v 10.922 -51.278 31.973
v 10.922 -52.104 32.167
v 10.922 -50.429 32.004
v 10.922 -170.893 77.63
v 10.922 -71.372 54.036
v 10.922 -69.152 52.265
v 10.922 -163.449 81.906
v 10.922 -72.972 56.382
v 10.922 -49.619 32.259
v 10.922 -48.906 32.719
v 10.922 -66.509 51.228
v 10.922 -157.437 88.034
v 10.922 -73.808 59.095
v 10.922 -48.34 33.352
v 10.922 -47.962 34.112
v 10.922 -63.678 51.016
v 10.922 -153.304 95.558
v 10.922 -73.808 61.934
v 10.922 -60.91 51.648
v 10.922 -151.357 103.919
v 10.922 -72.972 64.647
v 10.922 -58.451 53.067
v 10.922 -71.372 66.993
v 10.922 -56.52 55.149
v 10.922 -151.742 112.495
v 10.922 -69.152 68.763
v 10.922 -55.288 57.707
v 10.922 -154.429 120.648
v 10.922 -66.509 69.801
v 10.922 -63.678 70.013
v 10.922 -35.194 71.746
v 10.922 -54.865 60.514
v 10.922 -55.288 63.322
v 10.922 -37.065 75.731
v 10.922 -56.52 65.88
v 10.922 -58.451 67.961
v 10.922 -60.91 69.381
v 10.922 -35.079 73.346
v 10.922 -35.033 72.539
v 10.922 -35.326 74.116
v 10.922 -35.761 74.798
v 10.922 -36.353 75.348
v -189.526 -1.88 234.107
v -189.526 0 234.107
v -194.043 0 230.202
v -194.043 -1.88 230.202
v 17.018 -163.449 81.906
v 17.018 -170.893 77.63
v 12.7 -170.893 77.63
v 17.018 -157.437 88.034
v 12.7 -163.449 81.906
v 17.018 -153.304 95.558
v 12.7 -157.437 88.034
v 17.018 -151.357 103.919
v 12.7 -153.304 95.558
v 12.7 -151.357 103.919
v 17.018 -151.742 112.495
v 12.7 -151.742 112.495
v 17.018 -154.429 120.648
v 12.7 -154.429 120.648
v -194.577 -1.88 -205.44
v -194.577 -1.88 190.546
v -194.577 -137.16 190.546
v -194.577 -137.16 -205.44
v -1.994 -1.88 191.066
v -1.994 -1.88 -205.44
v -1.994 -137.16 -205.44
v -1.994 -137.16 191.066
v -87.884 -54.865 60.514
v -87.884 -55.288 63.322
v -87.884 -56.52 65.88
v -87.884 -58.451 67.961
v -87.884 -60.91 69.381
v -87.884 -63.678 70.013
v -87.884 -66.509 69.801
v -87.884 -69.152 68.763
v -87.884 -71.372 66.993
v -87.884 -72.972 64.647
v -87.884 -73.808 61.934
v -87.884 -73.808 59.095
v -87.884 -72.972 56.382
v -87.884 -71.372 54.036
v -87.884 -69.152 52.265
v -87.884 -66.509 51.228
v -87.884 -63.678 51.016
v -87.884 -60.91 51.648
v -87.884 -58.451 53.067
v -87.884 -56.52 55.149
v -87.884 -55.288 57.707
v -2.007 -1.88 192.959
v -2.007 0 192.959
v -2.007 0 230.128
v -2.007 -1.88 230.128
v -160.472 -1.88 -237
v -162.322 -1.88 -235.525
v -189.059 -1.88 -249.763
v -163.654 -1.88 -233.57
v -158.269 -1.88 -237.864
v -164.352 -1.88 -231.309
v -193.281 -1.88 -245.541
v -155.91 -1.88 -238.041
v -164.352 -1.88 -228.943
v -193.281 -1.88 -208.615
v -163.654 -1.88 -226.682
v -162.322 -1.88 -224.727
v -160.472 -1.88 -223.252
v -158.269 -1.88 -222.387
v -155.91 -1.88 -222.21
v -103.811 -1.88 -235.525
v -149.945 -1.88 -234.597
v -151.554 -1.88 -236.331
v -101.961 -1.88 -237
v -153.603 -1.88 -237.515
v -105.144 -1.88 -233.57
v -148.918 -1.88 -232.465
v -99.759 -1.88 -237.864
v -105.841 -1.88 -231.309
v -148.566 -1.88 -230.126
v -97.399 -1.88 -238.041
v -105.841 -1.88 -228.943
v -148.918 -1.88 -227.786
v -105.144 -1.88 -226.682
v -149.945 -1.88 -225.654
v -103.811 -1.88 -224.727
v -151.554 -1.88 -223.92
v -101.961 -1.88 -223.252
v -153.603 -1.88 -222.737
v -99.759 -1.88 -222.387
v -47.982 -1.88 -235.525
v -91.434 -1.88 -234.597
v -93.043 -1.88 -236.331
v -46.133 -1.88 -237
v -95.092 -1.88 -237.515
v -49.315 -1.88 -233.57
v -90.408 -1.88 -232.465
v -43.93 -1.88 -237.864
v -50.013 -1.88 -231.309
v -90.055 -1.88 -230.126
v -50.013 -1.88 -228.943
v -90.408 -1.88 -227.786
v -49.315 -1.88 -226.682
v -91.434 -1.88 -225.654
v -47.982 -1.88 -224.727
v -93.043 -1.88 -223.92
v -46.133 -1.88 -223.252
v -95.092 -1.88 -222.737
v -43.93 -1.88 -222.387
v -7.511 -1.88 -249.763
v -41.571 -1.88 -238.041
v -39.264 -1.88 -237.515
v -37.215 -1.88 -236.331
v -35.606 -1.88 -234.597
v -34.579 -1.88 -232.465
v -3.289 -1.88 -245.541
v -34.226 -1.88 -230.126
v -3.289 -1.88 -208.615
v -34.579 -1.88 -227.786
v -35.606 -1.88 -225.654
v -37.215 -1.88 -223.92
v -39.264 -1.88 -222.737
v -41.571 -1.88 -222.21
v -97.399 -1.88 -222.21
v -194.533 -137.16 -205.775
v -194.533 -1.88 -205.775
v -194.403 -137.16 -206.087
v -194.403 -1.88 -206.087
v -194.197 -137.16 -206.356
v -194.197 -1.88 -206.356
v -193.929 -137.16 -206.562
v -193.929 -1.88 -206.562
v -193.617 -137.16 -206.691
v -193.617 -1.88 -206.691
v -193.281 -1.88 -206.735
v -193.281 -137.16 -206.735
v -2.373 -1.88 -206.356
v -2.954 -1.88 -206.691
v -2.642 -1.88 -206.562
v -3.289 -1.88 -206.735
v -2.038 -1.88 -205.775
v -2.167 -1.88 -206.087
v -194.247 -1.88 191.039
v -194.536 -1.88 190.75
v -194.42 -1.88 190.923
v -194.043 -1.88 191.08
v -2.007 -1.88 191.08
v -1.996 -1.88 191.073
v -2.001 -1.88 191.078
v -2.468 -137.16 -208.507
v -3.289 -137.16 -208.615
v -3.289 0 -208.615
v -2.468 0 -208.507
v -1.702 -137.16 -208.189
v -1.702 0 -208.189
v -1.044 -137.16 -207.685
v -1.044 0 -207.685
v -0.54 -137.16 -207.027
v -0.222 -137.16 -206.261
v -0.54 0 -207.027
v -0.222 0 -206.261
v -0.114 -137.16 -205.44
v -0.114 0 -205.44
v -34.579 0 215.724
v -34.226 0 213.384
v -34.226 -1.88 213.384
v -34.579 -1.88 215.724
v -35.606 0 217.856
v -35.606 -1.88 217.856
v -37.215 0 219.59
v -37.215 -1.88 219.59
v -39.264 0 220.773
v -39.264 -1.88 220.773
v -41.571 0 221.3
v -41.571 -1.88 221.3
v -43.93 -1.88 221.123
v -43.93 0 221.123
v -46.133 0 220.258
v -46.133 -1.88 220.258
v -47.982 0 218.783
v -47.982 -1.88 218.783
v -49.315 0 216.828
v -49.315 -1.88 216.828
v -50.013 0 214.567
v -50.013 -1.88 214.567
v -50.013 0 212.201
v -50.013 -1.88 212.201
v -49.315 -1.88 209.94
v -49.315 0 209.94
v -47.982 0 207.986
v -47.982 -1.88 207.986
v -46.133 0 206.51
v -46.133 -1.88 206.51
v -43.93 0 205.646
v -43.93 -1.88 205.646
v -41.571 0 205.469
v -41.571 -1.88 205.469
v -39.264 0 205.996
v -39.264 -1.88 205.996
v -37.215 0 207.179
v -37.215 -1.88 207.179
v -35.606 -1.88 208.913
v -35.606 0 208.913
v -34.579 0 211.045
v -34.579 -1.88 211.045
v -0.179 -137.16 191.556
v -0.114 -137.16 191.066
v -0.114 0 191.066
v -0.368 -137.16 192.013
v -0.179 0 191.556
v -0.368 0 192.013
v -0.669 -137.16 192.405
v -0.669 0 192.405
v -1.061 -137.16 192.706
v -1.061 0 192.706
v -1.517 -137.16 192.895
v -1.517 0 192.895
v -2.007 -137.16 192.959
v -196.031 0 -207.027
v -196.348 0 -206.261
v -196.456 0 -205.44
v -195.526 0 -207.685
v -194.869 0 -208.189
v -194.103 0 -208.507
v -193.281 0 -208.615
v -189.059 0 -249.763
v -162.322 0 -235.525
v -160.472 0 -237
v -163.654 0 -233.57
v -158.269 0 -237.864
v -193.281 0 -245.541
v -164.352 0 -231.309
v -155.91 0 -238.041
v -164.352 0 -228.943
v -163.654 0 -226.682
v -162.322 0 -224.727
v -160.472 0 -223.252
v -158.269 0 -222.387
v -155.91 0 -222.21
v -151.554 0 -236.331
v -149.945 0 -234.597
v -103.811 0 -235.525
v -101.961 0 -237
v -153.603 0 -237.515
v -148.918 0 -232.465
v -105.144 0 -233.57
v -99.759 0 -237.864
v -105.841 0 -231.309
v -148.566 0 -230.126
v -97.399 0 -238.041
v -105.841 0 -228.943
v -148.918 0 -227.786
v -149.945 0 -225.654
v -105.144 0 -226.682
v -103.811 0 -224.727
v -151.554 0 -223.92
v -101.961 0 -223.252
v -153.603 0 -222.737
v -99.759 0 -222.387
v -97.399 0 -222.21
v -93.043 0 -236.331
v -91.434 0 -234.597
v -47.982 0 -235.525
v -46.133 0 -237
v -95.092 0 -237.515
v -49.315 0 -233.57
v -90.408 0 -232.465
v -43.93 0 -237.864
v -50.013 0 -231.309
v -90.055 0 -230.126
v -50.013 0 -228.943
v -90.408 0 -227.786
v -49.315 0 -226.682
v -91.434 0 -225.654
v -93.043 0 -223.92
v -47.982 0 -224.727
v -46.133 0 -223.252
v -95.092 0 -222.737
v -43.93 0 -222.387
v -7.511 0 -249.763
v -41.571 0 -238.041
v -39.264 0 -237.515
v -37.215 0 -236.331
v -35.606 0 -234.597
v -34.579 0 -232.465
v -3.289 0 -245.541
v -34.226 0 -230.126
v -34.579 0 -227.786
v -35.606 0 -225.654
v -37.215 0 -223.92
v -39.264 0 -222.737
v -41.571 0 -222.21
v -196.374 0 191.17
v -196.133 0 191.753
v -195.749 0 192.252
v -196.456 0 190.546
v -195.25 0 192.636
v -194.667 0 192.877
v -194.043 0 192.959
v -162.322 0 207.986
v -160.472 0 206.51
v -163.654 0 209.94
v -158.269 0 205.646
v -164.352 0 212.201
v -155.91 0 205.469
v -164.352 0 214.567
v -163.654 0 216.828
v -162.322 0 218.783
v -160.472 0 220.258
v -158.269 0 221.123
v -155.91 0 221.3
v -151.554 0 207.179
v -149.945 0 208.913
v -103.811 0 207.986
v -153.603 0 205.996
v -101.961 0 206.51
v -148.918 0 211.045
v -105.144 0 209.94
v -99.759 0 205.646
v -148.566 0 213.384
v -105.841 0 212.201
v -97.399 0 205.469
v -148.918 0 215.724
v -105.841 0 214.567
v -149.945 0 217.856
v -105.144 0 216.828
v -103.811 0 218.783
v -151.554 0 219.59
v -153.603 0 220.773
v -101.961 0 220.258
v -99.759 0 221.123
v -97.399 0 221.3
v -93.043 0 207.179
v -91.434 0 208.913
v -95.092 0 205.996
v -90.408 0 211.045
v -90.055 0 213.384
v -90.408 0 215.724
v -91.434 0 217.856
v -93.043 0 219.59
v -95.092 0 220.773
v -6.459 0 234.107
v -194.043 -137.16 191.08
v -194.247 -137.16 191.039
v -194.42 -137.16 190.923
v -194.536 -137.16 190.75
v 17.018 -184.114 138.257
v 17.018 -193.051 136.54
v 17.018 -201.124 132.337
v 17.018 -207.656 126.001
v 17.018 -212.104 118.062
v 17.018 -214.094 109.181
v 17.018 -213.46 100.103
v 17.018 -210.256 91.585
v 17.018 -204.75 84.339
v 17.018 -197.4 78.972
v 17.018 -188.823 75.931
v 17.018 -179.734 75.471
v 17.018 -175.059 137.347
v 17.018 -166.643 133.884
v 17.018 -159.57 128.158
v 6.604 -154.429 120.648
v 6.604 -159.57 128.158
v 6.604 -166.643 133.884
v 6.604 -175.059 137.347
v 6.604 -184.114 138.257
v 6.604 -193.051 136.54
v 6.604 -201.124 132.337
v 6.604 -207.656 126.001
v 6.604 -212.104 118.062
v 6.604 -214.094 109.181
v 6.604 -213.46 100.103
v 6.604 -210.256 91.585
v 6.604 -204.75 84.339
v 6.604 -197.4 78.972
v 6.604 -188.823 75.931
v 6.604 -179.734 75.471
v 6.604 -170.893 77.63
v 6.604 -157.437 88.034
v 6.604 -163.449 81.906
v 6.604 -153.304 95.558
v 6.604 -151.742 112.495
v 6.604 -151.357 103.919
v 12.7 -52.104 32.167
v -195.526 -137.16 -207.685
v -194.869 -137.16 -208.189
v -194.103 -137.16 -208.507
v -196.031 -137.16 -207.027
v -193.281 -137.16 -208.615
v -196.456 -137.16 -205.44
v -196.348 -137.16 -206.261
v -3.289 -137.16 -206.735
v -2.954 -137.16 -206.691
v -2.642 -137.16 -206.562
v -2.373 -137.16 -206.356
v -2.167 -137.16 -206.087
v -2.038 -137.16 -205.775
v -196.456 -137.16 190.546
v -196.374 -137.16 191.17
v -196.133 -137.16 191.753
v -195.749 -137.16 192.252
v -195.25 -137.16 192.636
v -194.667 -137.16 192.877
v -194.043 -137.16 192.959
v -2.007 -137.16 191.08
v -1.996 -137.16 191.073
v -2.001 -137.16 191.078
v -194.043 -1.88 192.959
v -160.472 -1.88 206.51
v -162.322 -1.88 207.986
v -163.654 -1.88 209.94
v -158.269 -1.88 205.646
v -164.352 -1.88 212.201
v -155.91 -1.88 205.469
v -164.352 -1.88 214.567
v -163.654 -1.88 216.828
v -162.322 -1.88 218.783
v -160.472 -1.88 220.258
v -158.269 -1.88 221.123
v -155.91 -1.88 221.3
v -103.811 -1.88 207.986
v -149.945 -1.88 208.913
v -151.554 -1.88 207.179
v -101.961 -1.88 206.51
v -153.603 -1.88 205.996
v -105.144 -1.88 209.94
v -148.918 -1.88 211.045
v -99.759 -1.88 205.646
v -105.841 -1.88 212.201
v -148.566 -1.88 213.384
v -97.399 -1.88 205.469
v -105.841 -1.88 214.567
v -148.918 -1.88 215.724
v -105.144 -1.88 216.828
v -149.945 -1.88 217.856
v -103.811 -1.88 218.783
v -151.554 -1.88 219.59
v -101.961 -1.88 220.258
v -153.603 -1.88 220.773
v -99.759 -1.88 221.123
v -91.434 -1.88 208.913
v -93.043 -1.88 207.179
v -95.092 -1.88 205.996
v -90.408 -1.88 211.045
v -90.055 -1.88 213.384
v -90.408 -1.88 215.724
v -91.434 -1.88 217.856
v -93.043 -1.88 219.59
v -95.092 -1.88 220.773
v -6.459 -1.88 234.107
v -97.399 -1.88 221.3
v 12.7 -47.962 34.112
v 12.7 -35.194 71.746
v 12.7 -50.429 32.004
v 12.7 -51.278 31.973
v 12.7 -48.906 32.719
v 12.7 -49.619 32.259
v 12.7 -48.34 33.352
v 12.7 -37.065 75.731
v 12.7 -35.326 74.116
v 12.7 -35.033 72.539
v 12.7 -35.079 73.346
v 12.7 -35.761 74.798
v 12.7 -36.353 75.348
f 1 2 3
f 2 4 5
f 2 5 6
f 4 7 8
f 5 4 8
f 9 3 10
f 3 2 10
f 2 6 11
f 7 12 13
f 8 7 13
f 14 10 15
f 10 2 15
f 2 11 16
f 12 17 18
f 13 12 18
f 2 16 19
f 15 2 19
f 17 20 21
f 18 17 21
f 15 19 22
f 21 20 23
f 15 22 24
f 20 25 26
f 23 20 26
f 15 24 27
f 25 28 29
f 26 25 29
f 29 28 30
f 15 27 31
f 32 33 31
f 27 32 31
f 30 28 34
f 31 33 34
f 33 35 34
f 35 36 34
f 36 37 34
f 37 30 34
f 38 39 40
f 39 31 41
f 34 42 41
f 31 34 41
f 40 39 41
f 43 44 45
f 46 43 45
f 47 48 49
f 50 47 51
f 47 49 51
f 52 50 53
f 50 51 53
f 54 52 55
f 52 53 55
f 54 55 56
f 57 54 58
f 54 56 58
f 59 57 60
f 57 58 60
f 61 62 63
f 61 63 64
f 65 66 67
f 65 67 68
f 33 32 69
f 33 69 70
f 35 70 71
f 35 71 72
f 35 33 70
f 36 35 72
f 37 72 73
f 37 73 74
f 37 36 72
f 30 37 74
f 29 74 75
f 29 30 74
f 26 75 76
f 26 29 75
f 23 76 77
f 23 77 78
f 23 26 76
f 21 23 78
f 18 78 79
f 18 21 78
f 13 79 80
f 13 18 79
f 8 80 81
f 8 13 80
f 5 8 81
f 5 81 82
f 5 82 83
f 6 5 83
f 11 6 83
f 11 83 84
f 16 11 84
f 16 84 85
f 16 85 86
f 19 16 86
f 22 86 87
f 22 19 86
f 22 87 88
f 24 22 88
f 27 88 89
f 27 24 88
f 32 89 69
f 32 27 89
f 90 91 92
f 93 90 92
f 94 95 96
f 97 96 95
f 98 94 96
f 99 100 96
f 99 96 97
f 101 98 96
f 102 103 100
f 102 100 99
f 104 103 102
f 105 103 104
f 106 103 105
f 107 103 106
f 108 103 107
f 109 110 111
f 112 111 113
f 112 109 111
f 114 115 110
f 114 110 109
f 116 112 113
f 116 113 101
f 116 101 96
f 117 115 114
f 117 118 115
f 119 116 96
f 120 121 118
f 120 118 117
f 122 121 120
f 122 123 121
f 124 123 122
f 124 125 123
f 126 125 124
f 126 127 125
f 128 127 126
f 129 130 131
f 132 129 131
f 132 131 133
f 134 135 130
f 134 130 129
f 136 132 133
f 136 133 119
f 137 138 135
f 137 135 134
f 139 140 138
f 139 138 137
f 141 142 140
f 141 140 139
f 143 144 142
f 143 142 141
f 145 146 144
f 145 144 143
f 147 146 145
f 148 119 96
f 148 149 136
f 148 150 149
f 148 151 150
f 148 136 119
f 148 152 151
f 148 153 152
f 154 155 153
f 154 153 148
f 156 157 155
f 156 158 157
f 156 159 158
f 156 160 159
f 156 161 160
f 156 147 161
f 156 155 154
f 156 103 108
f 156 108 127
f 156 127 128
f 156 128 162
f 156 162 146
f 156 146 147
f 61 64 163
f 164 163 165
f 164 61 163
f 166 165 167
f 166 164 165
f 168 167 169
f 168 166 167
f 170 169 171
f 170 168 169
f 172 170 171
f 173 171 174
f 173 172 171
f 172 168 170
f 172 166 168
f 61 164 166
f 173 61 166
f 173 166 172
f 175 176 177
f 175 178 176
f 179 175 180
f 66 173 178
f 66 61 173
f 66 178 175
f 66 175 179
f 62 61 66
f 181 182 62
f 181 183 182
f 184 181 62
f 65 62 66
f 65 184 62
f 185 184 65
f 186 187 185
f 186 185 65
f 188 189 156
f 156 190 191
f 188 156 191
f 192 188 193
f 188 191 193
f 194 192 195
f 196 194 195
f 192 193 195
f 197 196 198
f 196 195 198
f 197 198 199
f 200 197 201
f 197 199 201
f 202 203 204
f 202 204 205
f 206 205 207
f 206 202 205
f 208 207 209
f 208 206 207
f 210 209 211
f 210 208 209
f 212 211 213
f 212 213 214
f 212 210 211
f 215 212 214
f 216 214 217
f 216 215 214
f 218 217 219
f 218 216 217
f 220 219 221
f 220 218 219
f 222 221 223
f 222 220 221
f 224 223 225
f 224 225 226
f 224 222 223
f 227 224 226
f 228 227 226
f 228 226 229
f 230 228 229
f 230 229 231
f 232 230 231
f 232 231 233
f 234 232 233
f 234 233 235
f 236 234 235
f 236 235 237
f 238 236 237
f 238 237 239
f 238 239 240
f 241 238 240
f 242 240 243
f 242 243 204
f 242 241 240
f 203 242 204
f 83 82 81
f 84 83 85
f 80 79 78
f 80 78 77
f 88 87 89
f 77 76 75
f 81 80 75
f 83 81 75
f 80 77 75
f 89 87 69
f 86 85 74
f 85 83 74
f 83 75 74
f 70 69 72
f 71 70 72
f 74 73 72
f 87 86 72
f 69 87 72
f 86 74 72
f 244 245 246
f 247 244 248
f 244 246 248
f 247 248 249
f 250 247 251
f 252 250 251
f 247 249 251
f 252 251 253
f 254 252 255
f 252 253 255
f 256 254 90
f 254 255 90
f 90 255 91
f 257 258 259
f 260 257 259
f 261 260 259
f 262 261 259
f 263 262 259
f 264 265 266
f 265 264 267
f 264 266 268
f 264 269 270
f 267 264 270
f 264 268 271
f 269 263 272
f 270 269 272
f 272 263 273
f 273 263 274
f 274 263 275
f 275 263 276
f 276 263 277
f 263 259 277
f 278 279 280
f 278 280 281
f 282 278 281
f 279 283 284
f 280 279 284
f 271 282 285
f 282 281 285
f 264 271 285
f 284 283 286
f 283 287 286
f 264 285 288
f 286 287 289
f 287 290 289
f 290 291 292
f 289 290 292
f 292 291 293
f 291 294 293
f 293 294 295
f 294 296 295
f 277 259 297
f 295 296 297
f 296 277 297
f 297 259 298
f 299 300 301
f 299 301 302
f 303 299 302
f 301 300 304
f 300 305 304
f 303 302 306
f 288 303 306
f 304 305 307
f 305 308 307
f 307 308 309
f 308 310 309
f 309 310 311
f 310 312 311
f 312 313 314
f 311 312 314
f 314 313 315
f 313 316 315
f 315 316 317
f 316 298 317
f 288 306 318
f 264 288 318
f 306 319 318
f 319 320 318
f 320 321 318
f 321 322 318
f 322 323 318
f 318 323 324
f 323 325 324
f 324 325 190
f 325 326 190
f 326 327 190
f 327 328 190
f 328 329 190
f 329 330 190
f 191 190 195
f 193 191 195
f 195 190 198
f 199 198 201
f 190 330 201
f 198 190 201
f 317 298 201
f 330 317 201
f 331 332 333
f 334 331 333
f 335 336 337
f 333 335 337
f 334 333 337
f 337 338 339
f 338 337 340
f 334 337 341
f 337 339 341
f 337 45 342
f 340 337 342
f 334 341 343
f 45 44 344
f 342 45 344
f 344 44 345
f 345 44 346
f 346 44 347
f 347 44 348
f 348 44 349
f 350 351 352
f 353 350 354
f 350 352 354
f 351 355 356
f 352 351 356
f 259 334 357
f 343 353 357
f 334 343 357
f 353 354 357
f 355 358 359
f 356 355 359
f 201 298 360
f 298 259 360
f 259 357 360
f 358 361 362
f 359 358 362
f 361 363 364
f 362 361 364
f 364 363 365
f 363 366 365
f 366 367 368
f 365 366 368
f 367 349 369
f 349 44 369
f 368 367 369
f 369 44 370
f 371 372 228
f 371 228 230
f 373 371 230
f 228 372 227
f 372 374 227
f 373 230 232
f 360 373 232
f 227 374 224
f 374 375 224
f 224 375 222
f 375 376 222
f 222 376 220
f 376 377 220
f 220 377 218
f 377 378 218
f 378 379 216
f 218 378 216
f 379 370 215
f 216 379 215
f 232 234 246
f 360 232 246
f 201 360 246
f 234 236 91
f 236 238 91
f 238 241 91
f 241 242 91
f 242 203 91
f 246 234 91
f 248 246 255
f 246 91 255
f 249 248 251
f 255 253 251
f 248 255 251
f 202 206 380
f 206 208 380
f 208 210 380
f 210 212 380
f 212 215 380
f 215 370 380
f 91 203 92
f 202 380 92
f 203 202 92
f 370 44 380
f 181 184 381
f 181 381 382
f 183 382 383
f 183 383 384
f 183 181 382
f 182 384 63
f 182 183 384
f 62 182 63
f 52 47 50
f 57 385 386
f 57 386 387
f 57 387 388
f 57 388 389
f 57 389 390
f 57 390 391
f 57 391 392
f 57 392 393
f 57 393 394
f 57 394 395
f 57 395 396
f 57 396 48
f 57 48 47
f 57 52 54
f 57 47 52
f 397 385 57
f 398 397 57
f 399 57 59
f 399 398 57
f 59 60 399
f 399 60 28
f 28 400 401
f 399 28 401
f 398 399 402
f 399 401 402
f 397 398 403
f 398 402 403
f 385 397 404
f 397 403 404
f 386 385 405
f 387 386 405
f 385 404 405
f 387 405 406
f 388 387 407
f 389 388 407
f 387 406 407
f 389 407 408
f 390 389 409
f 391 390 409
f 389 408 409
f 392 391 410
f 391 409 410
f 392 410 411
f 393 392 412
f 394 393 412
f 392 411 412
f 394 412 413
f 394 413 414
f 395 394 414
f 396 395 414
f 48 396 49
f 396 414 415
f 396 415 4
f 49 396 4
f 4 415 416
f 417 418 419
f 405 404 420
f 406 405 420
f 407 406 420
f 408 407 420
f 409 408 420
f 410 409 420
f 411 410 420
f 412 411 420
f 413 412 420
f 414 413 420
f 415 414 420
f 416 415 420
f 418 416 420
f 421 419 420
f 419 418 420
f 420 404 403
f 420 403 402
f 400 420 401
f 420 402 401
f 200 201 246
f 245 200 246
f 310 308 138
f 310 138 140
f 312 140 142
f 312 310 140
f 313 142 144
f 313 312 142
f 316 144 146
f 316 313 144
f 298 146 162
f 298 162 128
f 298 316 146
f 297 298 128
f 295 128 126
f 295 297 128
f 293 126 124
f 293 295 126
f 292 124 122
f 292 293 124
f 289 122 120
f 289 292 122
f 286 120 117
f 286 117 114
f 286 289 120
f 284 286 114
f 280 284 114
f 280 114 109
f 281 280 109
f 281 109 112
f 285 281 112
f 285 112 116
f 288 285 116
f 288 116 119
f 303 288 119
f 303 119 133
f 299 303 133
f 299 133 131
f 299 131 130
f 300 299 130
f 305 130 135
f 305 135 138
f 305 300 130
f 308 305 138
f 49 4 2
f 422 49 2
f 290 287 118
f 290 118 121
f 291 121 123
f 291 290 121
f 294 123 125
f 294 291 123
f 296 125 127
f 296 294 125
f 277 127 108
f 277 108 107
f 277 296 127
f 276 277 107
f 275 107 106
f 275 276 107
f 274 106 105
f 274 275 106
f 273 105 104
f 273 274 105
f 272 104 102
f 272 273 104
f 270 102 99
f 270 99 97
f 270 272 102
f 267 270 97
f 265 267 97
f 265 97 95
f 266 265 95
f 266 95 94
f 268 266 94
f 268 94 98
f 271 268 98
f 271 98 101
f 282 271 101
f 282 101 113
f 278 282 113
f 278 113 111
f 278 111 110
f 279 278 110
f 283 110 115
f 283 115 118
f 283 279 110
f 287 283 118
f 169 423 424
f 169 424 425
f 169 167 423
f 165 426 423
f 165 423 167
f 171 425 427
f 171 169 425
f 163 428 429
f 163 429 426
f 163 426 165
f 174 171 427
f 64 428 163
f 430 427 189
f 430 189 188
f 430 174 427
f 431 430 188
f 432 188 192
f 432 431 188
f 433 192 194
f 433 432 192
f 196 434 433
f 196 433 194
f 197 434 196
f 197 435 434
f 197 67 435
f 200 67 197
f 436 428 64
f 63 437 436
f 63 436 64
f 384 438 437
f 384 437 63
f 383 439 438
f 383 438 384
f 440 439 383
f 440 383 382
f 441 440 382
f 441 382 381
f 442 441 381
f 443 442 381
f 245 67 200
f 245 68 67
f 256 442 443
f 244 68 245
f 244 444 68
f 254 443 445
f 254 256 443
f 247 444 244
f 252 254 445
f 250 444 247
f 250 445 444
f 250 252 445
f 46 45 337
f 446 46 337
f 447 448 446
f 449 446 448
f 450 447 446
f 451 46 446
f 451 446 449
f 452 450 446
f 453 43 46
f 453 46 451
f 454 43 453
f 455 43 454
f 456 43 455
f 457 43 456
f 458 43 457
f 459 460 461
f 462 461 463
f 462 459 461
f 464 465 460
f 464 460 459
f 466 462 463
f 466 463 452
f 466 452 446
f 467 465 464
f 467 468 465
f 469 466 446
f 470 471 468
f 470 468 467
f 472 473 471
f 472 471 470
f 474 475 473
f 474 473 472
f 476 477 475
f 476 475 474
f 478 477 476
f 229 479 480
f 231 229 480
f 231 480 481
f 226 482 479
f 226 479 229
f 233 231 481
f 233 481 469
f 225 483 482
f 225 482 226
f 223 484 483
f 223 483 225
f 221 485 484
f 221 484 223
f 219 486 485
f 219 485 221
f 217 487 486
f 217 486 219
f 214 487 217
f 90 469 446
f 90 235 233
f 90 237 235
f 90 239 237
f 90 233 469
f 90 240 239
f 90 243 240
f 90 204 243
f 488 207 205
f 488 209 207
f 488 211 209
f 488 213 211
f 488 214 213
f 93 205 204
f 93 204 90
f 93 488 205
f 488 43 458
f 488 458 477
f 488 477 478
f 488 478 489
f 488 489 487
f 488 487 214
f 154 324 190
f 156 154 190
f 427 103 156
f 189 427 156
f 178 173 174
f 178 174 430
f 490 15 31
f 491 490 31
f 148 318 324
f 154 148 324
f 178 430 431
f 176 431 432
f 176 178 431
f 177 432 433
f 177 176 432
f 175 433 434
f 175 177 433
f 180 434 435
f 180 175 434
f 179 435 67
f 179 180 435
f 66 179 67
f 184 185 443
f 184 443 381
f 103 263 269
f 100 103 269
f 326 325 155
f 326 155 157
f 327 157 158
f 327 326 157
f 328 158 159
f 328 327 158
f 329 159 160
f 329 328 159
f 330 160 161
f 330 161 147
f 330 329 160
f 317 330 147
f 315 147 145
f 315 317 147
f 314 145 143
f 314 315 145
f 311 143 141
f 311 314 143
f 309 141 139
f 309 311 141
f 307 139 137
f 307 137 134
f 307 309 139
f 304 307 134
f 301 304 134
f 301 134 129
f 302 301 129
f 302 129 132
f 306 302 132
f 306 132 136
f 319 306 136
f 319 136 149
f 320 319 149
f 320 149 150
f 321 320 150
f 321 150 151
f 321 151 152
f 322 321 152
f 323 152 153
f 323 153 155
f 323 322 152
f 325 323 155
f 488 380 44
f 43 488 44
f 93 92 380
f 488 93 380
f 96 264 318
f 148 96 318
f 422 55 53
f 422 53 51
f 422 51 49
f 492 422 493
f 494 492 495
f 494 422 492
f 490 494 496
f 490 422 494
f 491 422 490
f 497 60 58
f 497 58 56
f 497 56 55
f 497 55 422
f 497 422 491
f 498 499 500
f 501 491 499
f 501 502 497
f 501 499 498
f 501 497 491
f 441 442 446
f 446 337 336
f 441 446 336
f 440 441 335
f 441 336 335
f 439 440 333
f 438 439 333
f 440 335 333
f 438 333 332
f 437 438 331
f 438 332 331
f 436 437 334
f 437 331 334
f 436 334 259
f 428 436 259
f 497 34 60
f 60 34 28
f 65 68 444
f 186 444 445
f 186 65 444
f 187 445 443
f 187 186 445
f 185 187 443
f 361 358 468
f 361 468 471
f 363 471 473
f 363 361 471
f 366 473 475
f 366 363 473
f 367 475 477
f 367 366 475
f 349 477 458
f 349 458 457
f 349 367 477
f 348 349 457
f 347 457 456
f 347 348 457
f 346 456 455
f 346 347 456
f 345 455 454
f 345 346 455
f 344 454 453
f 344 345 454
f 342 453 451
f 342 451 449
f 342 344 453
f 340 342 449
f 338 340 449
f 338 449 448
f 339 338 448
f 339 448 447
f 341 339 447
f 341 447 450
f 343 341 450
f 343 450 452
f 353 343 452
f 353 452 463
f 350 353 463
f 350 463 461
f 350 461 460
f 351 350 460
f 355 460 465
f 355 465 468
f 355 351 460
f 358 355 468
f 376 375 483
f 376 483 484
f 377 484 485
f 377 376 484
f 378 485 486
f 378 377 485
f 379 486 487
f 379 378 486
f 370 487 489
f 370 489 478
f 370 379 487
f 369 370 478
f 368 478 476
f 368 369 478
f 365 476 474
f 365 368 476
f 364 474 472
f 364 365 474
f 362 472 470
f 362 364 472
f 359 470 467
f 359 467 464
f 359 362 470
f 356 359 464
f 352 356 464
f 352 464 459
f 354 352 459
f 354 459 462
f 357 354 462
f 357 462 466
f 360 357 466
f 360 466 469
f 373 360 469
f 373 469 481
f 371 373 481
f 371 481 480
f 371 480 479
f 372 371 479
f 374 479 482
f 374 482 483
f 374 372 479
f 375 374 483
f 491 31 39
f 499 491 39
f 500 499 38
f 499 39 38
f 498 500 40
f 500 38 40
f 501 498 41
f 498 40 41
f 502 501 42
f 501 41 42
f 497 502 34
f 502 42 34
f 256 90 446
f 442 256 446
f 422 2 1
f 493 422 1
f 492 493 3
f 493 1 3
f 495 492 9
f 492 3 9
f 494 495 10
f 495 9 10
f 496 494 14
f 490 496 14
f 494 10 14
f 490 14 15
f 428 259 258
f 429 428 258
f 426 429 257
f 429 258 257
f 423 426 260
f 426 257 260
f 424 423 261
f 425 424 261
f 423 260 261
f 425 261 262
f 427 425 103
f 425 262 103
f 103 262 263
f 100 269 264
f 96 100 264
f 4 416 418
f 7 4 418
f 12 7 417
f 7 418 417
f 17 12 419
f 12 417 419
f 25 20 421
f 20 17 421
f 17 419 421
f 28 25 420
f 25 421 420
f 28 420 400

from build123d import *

# Parameters (mm, degrees)
F1_DEPTH      = 137.16
F2_T          = -1.8796
F0_R          = 7.9375
F3_DEPTH      = 1.8796
F4_DEPTH      = 1.8796
F5_R          = 9.525
F6_DEPTH      = 12.7
F6_DEPTH_BACK = 87.884
F7_START      = 10.922
F7_DEPTH      = 1.778
F8_START      = 6.604
F8_DEPTH      = 10.414


with BuildPart() as f1:
    # F0 (on Front) → F1 (new body)
    with BuildSketch(Plane.XZ):
        with BuildLine():
            Line((-2.0074219073, 192.9593032377), (-194.0428123108, 192.9593032377))
            ThreePointArc((-194.0428123108, 192.9593032377), (-195.7494105797, 192.2524070892), (-196.4563067282, 190.5458088203))
            Line((-196.4563067282, 190.5458088203), (-196.4563067282, -205.4396967623))
            ThreePointArc((-196.4563067282, -205.4396967623), (-195.5263707585, -207.6847607926), (-193.2813067282, -208.6146967623))
            Line((-193.2813067282, -208.6146967623), (-3.2893067282, -208.6146967623))
            ThreePointArc((-3.2893067282, -208.6146967623), (-1.044242698, -207.6847607926), (-0.1143067282, -205.4396967623))
            Line((-0.1143067282, -205.4396967623), (-0.1143067282, 191.0661880586))
            ThreePointArc((-0.1143067282, 191.0661880586), (-0.6687873266, 192.4048226393), (-2.0074219073, 192.9593032377))
        make_face()
    extrude(amount=F1_DEPTH)

    # F2
    f2_openings = [f1.faces().sort_by_distance(p)[0] for p in [
        (-98.284712, -137.16, -7.821846),
    ]]
    offset(amount=F2_T, openings=f2_openings)

    # F0 (on Front) → F3 (join)
    with BuildSketch(Plane.XZ):
        Polygon((-194.0428123108, 230.2024903454), (-194.0428123108, 192.9593032377), (-2.0074219073, 192.9593032377), (-2.0074219073, 230.1279707811), (-6.4590077951, 234.1073032377), (-189.5257181129, 234.1073032377), align=None)
        with Locations((-156.5030515194, 213.3844196796)):
            Circle(F0_R, mode=Mode.SUBTRACT)
        with Locations((-97.992362954, 213.3844196796)):
            Circle(F0_R, mode=Mode.SUBTRACT)
        with Locations((-42.1637892723, 213.3844196796)):
            Circle(F0_R, mode=Mode.SUBTRACT)
    extrude(amount=F3_DEPTH)

    # F0 (on Front) → F4 (join)
    with BuildSketch(Plane.XZ):
        Polygon((-3.2893067282, -208.6146967623), (-193.2813067282, -208.6146967623), (-193.2813067282, -245.5406295129), (-189.0592394788, -249.7626967623), (-7.5113739777, -249.7626967623), (-3.2893067282, -245.5406295129), align=None)
        with Locations((-156.5030515194, -230.1257103682)):
            Circle(F0_R, mode=Mode.SUBTRACT)
        with Locations((-97.992362954, -230.1257103682)):
            Circle(F0_R, mode=Mode.SUBTRACT)
        with Locations((-42.1637892723, -230.1257103682)):
            Circle(F0_R, mode=Mode.SUBTRACT)
    extrude(amount=F4_DEPTH)


with BuildPart() as f6:
    # F5 (on Right) → F6 (new body, two sides)
    with BuildSketch(Plane.YZ) as f6_sk:
        with Locations((-64.3898770213, 60.5143420398)):
            Circle(F5_R)
    extrude(amount=F6_DEPTH)
    extrude(f6_sk.sketch, amount=-F6_DEPTH_BACK)

    # F5 (on Right) → F7 (join)
    with BuildSketch(Plane.YZ.offset(F7_START)):
        with BuildLine():
            Line((-170.8932016047, 77.6299208061), (-52.1039823193, 32.1673765925))
            ThreePointArc((-52.1039823193, 32.1673765925), (-49.6194014967, 32.2588096218), (-47.9624834755, 34.1124882708))
            Line((-47.9624834755, 34.1124882708), (-35.1935953372, 71.7459684203))
            ThreePointArc((-35.1935953372, 71.7459684203), (-35.3264211342, 74.1158419365), (-37.0653924768, 75.7313671901))
            Line((-37.0653924768, 75.7313671901), (-154.4293258485, 120.6484315675))
            ThreePointArc((-154.4293258485, 120.6484315675), (-152.0360599698, 113.9122285626), (-151.2243511721, 106.8097443975))
            ThreePointArc((-151.2243511721, 106.8097443975), (-156.6006711693, 89.2148176985), (-170.8932016047, 77.6299208061))
        make_face()
        with Locations((-64.3898770213, 60.5143420398)):
            Circle(F5_R, mode=Mode.SUBTRACT)
    extrude(amount=F7_DEPTH)

    # F5 (on Right) → F8 (join)
    with BuildSketch(Plane.YZ.offset(F8_START)):
        with BuildLine():
            ThreePointArc((-154.4293258485, 120.6484315675), (-212.1035088949, 118.0615183867), (-170.8932016047, 77.6299208061))
            ThreePointArc((-170.8932016047, 77.6299208061), (-156.6006711693, 89.2148176985), (-151.2243511721, 106.8097443975))
            ThreePointArc((-151.2243511721, 106.8097443975), (-152.0360599698, 113.9122285626), (-154.4293258485, 120.6484315675))
        make_face()
    extrude(amount=F8_DEPTH)


solid = Compound([f1.part, f6.part])
